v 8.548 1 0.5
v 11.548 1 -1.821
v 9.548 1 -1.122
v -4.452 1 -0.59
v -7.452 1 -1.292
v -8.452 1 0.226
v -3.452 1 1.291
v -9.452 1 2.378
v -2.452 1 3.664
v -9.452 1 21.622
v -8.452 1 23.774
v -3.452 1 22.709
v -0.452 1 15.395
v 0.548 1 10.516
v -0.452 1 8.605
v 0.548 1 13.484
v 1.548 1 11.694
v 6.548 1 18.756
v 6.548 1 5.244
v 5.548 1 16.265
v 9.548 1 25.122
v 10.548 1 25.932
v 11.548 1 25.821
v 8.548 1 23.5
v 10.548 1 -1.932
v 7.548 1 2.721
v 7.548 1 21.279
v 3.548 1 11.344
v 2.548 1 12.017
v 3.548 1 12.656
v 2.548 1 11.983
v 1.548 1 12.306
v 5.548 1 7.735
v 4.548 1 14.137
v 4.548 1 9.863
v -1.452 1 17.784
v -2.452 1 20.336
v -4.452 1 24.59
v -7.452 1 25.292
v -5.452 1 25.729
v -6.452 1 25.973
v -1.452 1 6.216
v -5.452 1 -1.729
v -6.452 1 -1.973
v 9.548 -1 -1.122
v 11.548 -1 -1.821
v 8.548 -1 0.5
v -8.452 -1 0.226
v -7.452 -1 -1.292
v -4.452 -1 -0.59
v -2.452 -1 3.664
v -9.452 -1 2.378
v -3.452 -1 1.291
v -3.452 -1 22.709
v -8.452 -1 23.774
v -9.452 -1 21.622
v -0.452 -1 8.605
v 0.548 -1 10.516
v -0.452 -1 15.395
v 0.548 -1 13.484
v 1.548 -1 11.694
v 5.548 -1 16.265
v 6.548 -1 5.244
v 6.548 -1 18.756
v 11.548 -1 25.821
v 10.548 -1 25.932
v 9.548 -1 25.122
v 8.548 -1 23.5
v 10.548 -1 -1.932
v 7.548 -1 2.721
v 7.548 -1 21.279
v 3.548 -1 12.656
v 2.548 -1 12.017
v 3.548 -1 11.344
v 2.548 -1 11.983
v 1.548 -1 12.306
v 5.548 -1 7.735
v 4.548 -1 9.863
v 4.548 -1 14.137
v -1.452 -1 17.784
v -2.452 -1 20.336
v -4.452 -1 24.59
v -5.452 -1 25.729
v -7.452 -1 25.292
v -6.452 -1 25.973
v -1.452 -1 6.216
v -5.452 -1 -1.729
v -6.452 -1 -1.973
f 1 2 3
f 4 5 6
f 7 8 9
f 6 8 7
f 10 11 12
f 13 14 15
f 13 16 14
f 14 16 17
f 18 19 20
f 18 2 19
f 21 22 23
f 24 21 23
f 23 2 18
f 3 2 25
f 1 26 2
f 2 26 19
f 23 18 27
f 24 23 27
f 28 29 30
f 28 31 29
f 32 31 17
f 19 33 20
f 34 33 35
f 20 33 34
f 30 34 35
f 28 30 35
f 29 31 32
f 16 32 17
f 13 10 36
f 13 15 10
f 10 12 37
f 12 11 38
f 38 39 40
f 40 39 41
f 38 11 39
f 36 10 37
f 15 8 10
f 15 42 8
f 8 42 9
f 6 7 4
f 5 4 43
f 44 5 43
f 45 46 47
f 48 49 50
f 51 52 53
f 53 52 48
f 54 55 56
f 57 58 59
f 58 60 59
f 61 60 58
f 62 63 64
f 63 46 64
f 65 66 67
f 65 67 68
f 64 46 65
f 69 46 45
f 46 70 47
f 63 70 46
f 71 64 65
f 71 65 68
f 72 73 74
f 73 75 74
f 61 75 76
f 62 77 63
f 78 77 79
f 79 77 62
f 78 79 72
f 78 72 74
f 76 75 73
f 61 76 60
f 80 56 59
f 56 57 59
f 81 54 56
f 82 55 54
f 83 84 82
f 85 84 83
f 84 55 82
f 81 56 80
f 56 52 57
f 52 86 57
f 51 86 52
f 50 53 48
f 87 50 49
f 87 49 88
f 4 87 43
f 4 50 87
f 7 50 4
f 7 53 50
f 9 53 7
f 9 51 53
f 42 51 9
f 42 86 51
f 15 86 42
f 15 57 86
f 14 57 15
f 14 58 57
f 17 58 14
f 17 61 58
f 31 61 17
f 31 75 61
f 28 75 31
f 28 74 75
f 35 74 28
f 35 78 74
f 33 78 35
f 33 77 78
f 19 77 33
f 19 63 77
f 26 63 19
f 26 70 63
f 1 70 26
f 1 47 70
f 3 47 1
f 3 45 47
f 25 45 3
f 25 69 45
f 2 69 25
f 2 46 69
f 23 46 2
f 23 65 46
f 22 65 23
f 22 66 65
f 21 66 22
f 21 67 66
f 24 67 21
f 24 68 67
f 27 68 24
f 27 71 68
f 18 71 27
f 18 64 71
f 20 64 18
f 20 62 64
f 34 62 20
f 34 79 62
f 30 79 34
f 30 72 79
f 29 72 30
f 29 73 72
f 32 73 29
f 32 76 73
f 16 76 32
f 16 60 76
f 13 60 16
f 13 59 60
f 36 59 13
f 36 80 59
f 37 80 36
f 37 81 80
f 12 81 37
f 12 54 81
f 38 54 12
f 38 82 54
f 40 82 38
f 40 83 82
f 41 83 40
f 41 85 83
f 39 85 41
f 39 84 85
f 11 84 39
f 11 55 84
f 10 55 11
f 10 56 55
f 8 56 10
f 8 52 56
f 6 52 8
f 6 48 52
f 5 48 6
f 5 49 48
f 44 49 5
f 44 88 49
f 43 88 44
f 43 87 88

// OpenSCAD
// scale things by wavey functions

// break range into parts
parts = 20;
// each part will climb how many z-axis units
units_per_part = 1;
// from zero, how many degrees to be covered?
degrees = 420;
deg_per_part = degrees/parts;
// starting x at z=0
sizex=7;
sizey=4;
unit_part = units_per_part*parts;
newx = max(.01, sizex);
pi = 3.141592653589793;

module solidwave (x){
	for (i=[x:deg_per_part:x+degrees]){
			translate([0,0,unit_part*i/degrees - unit_part*0.5])  // - unit_part*0.5 to center it
				cylinder(r1=newx + newx*sin(i), r2=newx + newx*sin(i+deg_per_part), h=units_per_part, center=true, $fn=48);
	}
}

module waveline (q=90, perimeter=pi*newx*2){
	scaler=1 + newx / (newx+sizey);
	sizeup = sizey * scaler * parts;
	for (i=[0:deg_per_part:degrees]){

			translate([newx*cos(i)/2, newx*sin(i)/2,   i/degrees*unit_part]) //  i/degrees*unit_part
				rotate([(cos(i)*degrees/parts-33), (degrees/parts*sin(i)), i])
					
				//scale([units_per_part+units_per_part*sin(i),units_per_part+units_per_part*cos(i),1])
					linear_extrude(height=sizey, center=true, scale=[1,.8]){
						square([perimeter/sizeup*sizey,perimeter/sizeup*sizey,], center=true);
					}
	}
}

translate([0,0,12])
rotate([90,0,0])
	linear_extrude(height=2, center=true, scale=[1,1]){

		projection(cut = false) 	rotate([0,90,0]) solidwave(22);
	}
//projection(cut = false)			rotate([0,90,0]) waveline();
